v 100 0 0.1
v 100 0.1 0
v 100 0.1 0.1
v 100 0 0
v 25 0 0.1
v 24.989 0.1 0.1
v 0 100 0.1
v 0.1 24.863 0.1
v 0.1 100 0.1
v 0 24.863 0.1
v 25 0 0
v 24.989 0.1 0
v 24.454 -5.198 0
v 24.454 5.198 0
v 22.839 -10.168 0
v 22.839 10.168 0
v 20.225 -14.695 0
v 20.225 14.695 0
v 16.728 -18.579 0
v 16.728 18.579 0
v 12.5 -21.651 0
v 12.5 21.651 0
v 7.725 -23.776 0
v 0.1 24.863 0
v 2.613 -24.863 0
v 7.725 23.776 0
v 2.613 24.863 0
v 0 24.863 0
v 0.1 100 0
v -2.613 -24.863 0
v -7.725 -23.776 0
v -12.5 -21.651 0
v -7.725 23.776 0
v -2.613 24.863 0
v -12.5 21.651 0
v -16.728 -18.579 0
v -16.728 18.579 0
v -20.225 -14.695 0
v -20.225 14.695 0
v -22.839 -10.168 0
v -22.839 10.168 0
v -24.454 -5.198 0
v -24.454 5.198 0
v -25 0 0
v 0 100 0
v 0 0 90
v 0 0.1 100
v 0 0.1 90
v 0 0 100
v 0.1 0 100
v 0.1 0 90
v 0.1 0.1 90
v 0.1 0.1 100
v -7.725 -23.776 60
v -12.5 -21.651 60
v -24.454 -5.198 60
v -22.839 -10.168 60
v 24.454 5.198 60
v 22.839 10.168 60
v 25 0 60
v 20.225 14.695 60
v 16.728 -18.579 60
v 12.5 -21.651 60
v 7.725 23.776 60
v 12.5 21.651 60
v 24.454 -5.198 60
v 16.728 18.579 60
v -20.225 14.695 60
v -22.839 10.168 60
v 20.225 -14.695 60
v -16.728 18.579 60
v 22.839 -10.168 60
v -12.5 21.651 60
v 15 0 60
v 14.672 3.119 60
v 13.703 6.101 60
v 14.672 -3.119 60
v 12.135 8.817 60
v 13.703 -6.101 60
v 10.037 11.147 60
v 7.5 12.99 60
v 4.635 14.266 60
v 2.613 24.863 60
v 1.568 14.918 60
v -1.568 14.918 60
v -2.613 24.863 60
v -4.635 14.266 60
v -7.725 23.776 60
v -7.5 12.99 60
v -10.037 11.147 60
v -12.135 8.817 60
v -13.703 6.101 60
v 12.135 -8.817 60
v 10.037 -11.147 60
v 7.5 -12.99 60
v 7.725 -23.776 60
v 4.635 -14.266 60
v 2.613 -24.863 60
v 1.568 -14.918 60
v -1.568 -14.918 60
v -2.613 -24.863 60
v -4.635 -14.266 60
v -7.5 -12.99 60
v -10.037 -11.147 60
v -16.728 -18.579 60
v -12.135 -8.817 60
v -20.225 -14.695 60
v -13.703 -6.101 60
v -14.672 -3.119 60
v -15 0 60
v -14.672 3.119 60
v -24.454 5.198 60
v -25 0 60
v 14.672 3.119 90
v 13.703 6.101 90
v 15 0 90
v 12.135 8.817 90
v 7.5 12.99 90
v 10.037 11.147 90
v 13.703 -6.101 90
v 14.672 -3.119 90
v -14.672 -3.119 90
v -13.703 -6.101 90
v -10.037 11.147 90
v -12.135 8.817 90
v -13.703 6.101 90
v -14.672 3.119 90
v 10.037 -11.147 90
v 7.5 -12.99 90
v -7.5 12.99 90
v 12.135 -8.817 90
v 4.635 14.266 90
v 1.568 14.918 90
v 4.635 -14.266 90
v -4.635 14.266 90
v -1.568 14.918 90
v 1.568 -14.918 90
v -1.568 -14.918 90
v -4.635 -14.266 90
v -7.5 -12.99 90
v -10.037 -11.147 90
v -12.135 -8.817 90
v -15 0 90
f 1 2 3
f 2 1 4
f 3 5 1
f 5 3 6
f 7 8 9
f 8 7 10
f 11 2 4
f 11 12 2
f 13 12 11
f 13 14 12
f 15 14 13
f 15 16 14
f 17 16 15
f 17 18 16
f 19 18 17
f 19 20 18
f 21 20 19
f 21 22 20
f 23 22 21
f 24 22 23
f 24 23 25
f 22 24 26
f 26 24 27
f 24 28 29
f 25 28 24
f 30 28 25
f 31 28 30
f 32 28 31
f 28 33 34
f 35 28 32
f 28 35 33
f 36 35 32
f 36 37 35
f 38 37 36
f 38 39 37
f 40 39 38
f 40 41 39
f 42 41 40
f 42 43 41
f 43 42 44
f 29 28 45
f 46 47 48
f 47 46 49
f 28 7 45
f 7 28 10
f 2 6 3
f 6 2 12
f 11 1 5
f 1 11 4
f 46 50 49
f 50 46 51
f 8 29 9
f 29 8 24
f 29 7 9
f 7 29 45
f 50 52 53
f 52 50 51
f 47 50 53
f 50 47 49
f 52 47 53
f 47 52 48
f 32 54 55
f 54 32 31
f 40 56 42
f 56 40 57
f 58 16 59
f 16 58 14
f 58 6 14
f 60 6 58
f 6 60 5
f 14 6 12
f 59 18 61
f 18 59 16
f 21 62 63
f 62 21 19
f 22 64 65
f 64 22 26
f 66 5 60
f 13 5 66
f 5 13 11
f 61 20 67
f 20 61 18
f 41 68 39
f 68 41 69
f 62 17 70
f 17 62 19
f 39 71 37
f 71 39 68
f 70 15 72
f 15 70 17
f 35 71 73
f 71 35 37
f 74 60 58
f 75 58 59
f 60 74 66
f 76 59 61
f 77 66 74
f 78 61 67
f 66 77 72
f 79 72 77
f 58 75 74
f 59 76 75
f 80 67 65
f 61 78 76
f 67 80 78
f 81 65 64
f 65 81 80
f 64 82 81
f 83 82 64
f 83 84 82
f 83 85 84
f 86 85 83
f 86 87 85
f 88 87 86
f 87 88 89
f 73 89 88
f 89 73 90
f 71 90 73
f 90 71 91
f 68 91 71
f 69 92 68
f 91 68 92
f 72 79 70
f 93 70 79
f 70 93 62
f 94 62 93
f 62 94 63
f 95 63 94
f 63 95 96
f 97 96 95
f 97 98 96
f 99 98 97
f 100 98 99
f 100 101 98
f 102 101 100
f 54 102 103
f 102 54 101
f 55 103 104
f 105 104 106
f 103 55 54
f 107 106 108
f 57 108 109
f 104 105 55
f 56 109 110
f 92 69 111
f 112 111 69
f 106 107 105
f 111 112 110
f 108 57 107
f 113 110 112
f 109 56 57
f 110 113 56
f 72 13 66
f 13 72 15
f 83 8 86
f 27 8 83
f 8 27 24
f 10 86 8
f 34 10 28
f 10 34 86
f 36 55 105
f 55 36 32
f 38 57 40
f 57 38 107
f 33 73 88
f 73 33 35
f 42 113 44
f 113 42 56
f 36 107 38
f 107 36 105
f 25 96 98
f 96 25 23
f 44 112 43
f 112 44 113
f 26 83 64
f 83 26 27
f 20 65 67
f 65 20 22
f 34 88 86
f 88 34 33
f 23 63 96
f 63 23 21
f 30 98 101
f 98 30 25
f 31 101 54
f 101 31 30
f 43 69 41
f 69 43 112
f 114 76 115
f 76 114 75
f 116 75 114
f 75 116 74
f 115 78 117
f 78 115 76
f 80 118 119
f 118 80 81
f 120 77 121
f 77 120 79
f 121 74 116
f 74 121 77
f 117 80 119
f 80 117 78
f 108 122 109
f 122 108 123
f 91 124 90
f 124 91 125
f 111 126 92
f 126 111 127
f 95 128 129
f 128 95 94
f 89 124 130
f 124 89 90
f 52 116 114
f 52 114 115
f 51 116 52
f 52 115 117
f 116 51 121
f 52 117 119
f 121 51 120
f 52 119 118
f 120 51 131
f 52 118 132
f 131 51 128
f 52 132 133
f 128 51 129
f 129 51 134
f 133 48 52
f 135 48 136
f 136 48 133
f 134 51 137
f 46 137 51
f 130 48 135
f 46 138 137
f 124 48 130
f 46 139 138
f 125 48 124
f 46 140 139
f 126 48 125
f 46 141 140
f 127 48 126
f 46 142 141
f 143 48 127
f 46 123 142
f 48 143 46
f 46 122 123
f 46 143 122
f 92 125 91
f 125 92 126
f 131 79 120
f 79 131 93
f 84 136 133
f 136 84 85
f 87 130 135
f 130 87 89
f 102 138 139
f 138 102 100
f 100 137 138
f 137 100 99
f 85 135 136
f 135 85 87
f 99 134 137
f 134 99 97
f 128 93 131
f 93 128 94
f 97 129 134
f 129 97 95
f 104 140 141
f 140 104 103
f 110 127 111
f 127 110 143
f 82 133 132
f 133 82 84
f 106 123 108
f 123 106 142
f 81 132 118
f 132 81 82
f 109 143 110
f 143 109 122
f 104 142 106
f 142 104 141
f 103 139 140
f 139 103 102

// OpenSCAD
    // Combined Scene

    // Permanent Model
    
    // Permanent Model (Black)
    color([0, 0, 0]) {
        // Your permanent model code here
        cube([100,0.1,0.1], center = false);
        cube([0.1,100,0.1], center = false);
        cube([0.1,0.1,100], center = false);
    }
    

    // Dynamic Model
    cylinder(h = 60, r = 25); 
translate([0, 0, 60]) {
    scale([1, 1, 1.5]) {
        cylinder(h = 20, r = 15);
    }
}
translate([0, 0, 80]) {
    cylinder(h = 5, r = 3); 
}
    
